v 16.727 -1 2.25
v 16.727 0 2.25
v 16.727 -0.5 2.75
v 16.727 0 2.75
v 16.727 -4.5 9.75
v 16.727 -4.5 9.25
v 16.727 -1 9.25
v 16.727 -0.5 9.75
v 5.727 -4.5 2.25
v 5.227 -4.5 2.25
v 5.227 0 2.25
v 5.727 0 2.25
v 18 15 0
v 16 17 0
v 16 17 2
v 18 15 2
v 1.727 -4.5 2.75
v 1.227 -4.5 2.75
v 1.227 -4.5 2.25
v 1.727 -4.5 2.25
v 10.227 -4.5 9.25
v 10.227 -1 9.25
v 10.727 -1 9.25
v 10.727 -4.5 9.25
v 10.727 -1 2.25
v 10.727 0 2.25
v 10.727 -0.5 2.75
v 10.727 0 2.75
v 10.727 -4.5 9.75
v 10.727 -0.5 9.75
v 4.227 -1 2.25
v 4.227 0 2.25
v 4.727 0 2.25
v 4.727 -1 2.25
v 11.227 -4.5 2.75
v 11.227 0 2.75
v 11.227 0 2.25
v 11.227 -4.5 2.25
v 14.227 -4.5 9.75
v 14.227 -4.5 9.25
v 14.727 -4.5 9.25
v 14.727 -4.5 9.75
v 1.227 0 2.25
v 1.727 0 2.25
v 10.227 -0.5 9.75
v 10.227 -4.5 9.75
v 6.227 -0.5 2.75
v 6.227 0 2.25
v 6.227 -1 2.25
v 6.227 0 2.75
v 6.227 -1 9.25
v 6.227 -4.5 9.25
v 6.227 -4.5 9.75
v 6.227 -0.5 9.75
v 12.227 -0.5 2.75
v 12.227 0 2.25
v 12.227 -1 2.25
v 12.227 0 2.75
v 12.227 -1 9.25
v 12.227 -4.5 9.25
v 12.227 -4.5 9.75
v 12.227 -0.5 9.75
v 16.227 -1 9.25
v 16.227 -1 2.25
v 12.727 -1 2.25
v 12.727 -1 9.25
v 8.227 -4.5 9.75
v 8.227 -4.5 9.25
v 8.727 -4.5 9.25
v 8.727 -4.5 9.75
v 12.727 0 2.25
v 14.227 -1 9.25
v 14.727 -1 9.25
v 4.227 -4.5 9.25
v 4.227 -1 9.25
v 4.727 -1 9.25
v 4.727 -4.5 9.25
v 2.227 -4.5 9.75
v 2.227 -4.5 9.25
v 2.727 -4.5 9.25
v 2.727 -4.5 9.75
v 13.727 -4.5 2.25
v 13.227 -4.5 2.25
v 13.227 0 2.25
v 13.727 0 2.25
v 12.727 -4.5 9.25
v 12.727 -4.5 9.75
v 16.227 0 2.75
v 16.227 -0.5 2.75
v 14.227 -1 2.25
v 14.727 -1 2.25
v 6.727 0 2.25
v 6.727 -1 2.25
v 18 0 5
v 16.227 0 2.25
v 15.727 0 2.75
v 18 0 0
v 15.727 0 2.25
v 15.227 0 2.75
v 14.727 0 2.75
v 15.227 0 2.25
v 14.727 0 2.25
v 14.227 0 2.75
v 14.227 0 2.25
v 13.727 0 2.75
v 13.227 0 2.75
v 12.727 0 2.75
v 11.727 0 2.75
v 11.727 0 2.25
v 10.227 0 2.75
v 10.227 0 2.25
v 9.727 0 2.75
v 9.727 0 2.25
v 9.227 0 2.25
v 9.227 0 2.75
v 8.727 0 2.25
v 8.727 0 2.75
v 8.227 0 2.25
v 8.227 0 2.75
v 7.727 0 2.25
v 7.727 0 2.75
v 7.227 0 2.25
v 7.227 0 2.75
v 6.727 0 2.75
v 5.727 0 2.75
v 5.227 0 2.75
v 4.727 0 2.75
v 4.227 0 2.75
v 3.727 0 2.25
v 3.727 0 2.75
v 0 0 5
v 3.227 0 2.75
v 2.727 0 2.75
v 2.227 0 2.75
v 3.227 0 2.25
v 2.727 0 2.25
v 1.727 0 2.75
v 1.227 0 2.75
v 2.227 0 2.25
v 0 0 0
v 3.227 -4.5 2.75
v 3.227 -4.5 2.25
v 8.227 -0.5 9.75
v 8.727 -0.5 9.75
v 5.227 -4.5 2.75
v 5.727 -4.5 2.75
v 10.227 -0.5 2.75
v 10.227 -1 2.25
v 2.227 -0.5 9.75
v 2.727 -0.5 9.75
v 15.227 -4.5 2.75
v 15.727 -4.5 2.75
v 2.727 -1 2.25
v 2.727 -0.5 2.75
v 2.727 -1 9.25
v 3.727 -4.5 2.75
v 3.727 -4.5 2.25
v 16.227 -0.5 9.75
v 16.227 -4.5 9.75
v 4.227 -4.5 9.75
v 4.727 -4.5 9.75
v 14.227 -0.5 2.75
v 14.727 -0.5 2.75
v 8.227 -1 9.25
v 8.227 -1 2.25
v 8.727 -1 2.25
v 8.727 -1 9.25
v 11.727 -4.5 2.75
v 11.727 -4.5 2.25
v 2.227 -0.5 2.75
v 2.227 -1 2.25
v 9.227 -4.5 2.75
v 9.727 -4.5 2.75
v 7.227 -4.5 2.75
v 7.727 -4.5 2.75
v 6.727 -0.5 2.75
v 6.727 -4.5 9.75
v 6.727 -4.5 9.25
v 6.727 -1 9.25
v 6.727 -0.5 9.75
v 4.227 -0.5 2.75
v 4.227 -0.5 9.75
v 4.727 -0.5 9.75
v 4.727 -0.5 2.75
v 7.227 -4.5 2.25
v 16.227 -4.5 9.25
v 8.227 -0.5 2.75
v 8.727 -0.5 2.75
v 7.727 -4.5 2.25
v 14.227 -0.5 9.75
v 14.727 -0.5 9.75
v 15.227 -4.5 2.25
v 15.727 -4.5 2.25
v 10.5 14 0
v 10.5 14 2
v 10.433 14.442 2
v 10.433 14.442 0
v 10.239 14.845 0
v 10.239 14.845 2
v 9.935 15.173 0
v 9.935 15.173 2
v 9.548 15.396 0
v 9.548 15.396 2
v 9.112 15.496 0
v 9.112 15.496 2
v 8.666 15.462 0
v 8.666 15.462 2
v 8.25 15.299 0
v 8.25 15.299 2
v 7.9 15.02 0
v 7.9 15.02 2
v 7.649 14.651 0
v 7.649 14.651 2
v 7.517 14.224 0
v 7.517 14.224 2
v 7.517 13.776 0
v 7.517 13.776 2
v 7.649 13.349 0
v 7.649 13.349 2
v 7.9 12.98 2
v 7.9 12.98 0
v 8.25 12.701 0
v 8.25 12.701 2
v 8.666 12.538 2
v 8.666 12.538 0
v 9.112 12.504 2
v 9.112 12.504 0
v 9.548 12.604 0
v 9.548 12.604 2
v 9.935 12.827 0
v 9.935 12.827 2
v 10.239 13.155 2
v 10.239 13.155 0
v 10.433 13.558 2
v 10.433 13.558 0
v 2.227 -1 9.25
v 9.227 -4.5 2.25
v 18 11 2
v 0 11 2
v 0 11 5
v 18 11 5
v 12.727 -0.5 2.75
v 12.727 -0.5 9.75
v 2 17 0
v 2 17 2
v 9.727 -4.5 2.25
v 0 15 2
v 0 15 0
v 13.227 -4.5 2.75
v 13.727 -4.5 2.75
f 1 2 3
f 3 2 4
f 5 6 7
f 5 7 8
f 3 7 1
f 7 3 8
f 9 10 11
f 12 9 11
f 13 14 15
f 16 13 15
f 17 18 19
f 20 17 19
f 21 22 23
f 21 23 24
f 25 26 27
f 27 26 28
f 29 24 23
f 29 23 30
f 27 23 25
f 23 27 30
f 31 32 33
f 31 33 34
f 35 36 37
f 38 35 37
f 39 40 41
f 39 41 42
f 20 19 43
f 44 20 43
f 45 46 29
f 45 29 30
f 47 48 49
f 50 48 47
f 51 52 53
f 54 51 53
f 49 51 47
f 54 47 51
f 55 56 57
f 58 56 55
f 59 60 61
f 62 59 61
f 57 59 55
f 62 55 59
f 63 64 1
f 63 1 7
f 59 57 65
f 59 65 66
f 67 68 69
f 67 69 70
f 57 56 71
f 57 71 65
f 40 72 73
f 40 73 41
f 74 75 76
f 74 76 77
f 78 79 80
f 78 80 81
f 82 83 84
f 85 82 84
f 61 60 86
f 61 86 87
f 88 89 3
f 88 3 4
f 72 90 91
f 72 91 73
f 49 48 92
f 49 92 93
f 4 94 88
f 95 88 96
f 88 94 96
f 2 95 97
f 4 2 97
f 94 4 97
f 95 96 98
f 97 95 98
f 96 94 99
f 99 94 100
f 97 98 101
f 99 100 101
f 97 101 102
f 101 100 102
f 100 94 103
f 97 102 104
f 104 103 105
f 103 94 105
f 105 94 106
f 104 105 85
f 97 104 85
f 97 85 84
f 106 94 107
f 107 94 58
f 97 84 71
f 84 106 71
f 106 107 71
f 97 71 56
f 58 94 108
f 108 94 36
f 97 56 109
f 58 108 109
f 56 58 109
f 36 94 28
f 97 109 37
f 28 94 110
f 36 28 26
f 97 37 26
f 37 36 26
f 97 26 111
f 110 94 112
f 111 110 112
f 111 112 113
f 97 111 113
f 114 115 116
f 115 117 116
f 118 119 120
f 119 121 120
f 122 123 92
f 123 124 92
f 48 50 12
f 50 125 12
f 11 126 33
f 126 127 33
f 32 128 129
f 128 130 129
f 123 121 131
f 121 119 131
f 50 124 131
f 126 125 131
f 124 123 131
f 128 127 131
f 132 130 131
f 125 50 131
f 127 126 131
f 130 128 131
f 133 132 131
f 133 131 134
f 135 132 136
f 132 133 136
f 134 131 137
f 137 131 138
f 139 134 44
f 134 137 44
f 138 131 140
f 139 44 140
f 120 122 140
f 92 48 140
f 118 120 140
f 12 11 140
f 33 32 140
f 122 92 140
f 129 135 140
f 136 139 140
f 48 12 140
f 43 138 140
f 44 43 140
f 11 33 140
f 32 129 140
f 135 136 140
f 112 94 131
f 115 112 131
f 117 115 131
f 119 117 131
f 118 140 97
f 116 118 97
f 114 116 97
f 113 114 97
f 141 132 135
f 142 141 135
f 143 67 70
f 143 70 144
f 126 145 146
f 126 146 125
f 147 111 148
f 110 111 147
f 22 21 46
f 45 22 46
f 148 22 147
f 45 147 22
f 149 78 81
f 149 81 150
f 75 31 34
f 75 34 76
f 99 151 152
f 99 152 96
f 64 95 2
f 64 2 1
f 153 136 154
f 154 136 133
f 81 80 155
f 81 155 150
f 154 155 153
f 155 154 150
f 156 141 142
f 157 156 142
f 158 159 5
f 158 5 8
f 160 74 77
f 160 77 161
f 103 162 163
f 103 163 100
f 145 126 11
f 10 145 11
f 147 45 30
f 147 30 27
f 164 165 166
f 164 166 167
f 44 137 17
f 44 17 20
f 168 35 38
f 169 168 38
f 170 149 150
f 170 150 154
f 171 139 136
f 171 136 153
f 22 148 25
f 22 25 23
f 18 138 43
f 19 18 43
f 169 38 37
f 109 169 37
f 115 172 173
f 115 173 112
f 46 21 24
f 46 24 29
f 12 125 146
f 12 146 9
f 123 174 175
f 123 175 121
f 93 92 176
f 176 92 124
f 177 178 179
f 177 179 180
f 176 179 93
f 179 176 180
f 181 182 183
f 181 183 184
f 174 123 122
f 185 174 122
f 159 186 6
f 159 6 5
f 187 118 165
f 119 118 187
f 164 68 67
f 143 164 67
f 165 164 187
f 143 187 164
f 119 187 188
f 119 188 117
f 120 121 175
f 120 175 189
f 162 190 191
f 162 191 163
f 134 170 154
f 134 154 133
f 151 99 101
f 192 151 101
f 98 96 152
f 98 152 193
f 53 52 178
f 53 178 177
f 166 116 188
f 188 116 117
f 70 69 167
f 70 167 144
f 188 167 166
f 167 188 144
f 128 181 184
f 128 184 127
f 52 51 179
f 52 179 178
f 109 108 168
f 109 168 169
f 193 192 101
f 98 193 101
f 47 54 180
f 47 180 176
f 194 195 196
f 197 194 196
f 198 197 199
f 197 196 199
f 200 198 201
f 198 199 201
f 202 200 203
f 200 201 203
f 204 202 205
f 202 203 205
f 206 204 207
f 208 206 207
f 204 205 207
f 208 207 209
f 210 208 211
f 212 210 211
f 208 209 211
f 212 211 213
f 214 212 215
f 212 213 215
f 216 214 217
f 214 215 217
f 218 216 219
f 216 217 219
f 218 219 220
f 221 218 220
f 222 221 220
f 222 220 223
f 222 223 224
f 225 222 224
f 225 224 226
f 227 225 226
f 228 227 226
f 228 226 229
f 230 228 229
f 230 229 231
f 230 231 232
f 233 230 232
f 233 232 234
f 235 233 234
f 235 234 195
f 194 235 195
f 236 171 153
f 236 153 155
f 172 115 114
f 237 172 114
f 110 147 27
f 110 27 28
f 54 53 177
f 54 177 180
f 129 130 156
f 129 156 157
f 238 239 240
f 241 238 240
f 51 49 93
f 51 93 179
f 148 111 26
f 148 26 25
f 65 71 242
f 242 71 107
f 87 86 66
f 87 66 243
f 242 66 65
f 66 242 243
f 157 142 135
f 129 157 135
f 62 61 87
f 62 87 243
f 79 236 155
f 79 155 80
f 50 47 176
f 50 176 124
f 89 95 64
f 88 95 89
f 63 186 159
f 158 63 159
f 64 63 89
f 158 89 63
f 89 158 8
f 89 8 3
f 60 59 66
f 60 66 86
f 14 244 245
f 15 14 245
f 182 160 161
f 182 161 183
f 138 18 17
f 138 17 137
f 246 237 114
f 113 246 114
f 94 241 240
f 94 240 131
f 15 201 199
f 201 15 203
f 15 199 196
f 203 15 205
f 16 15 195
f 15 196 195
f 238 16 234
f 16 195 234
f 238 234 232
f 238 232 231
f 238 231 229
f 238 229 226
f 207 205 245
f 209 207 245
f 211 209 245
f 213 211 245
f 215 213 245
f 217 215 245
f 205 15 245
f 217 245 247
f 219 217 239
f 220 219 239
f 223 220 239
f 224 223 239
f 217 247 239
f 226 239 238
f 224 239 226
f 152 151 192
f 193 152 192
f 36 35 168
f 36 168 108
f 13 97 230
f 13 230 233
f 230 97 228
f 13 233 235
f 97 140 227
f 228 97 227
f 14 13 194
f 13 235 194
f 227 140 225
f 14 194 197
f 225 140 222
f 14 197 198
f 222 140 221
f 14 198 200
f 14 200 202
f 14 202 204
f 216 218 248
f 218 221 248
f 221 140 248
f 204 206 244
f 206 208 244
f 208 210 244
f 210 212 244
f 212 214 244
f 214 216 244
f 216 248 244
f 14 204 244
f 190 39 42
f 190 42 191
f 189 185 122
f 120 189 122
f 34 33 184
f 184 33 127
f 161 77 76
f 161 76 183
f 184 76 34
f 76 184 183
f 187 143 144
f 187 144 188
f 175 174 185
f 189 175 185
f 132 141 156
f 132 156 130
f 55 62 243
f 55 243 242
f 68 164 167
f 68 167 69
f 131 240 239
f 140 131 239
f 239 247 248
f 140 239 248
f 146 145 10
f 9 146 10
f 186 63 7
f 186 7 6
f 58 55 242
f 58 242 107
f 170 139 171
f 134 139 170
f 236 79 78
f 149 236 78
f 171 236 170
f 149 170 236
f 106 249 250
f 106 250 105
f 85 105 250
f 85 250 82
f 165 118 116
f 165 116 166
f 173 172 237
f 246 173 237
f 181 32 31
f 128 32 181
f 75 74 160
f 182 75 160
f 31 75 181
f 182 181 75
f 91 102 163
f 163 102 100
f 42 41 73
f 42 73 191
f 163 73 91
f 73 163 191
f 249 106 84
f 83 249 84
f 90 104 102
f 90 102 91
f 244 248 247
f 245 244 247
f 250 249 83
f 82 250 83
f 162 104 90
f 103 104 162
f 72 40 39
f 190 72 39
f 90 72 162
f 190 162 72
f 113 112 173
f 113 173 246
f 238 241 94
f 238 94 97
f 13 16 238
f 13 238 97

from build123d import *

# Parameters (mm, degrees)
BOSS_EXTRUDE1_DEPTH = 18
SKETCH3_R           = 1.5
CUT_EXTRUDE1_DEPTH  = 25.939927827
CHAMFER1_SIZE       = 2
BOSS_EXTRUDE2_DEPTH = 0.5
LPATTERN1_COUNT     = 8
LPATTERN1_PITCH     = 2
SKETCH5_W           = 0.5
SKETCH5_H           = 4.5
BOSS_EXTRUDE3_DEPTH = 0.5
LPATTERN2_COUNT     = 8
LPATTERN2_PITCH     = 2


with BuildPart() as part:
    # Sketch2 → Boss-Extrude1 (new body)
    with BuildSketch(Plane(origin=(0, 0, 0), x_dir=(0, 0, -1), z_dir=(1, 0, 0))):
        Polygon((0, 0), (0, 17), (-2, 17), (-2, 11), (-5, 11), (-5, 0), align=None)
    extrude(amount=BOSS_EXTRUDE1_DEPTH)

    # Sketch3 → Cut-Extrude1 (cut, through all)
    with BuildSketch(Plane.XY.offset(2)):
        with Locations((9, 14)):
            Circle(SKETCH3_R)
    extrude(amount=-CUT_EXTRUDE1_DEPTH, mode=Mode.SUBTRACT)

    # Chamfer1
    chamfer1_edges = [part.edges().sort_by_distance(p)[0] for p in [
        (18, 17, 1),
        (0, 17, 1),
    ]]
    chamfer(chamfer1_edges, length=CHAMFER1_SIZE)

    # Sketch4 → Boss-Extrude2 (add)
    with BuildSketch(Plane(origin=(2.227, 0, 0), x_dir=(0, 0, -1), z_dir=(1, 0, 0))):
        Polygon((-2.25, 0), (-2.25, -1), (-9.25, -1), (-9.25, -4.5), (-9.75, -4.5), (-9.75, -0.5), (-2.75, -0.5), (-2.75, 0), align=None)
    boss_extrude2 = extrude(amount=BOSS_EXTRUDE2_DEPTH)

    # LPattern1: Boss-Extrude2 ×8
    with Locations(*[(i * LPATTERN1_PITCH, 0, 0) for i in range(1, LPATTERN1_COUNT)]):
        add(boss_extrude2)

    # Sketch5 → Boss-Extrude3 (add)
    with BuildSketch(Plane(origin=(1.227, 0, 0), x_dir=(0, 0, -1), z_dir=(1, 0, 0))):
        with Locations((-2.5, -2.25)):
            Rectangle(SKETCH5_W, SKETCH5_H)
    boss_extrude3 = extrude(amount=BOSS_EXTRUDE3_DEPTH)

    # LPattern2: Boss-Extrude3 ×8
    with Locations(*[(i * LPATTERN2_PITCH, 0, 0) for i in range(1, LPATTERN2_COUNT)]):
        add(boss_extrude3)


solid = part.part
